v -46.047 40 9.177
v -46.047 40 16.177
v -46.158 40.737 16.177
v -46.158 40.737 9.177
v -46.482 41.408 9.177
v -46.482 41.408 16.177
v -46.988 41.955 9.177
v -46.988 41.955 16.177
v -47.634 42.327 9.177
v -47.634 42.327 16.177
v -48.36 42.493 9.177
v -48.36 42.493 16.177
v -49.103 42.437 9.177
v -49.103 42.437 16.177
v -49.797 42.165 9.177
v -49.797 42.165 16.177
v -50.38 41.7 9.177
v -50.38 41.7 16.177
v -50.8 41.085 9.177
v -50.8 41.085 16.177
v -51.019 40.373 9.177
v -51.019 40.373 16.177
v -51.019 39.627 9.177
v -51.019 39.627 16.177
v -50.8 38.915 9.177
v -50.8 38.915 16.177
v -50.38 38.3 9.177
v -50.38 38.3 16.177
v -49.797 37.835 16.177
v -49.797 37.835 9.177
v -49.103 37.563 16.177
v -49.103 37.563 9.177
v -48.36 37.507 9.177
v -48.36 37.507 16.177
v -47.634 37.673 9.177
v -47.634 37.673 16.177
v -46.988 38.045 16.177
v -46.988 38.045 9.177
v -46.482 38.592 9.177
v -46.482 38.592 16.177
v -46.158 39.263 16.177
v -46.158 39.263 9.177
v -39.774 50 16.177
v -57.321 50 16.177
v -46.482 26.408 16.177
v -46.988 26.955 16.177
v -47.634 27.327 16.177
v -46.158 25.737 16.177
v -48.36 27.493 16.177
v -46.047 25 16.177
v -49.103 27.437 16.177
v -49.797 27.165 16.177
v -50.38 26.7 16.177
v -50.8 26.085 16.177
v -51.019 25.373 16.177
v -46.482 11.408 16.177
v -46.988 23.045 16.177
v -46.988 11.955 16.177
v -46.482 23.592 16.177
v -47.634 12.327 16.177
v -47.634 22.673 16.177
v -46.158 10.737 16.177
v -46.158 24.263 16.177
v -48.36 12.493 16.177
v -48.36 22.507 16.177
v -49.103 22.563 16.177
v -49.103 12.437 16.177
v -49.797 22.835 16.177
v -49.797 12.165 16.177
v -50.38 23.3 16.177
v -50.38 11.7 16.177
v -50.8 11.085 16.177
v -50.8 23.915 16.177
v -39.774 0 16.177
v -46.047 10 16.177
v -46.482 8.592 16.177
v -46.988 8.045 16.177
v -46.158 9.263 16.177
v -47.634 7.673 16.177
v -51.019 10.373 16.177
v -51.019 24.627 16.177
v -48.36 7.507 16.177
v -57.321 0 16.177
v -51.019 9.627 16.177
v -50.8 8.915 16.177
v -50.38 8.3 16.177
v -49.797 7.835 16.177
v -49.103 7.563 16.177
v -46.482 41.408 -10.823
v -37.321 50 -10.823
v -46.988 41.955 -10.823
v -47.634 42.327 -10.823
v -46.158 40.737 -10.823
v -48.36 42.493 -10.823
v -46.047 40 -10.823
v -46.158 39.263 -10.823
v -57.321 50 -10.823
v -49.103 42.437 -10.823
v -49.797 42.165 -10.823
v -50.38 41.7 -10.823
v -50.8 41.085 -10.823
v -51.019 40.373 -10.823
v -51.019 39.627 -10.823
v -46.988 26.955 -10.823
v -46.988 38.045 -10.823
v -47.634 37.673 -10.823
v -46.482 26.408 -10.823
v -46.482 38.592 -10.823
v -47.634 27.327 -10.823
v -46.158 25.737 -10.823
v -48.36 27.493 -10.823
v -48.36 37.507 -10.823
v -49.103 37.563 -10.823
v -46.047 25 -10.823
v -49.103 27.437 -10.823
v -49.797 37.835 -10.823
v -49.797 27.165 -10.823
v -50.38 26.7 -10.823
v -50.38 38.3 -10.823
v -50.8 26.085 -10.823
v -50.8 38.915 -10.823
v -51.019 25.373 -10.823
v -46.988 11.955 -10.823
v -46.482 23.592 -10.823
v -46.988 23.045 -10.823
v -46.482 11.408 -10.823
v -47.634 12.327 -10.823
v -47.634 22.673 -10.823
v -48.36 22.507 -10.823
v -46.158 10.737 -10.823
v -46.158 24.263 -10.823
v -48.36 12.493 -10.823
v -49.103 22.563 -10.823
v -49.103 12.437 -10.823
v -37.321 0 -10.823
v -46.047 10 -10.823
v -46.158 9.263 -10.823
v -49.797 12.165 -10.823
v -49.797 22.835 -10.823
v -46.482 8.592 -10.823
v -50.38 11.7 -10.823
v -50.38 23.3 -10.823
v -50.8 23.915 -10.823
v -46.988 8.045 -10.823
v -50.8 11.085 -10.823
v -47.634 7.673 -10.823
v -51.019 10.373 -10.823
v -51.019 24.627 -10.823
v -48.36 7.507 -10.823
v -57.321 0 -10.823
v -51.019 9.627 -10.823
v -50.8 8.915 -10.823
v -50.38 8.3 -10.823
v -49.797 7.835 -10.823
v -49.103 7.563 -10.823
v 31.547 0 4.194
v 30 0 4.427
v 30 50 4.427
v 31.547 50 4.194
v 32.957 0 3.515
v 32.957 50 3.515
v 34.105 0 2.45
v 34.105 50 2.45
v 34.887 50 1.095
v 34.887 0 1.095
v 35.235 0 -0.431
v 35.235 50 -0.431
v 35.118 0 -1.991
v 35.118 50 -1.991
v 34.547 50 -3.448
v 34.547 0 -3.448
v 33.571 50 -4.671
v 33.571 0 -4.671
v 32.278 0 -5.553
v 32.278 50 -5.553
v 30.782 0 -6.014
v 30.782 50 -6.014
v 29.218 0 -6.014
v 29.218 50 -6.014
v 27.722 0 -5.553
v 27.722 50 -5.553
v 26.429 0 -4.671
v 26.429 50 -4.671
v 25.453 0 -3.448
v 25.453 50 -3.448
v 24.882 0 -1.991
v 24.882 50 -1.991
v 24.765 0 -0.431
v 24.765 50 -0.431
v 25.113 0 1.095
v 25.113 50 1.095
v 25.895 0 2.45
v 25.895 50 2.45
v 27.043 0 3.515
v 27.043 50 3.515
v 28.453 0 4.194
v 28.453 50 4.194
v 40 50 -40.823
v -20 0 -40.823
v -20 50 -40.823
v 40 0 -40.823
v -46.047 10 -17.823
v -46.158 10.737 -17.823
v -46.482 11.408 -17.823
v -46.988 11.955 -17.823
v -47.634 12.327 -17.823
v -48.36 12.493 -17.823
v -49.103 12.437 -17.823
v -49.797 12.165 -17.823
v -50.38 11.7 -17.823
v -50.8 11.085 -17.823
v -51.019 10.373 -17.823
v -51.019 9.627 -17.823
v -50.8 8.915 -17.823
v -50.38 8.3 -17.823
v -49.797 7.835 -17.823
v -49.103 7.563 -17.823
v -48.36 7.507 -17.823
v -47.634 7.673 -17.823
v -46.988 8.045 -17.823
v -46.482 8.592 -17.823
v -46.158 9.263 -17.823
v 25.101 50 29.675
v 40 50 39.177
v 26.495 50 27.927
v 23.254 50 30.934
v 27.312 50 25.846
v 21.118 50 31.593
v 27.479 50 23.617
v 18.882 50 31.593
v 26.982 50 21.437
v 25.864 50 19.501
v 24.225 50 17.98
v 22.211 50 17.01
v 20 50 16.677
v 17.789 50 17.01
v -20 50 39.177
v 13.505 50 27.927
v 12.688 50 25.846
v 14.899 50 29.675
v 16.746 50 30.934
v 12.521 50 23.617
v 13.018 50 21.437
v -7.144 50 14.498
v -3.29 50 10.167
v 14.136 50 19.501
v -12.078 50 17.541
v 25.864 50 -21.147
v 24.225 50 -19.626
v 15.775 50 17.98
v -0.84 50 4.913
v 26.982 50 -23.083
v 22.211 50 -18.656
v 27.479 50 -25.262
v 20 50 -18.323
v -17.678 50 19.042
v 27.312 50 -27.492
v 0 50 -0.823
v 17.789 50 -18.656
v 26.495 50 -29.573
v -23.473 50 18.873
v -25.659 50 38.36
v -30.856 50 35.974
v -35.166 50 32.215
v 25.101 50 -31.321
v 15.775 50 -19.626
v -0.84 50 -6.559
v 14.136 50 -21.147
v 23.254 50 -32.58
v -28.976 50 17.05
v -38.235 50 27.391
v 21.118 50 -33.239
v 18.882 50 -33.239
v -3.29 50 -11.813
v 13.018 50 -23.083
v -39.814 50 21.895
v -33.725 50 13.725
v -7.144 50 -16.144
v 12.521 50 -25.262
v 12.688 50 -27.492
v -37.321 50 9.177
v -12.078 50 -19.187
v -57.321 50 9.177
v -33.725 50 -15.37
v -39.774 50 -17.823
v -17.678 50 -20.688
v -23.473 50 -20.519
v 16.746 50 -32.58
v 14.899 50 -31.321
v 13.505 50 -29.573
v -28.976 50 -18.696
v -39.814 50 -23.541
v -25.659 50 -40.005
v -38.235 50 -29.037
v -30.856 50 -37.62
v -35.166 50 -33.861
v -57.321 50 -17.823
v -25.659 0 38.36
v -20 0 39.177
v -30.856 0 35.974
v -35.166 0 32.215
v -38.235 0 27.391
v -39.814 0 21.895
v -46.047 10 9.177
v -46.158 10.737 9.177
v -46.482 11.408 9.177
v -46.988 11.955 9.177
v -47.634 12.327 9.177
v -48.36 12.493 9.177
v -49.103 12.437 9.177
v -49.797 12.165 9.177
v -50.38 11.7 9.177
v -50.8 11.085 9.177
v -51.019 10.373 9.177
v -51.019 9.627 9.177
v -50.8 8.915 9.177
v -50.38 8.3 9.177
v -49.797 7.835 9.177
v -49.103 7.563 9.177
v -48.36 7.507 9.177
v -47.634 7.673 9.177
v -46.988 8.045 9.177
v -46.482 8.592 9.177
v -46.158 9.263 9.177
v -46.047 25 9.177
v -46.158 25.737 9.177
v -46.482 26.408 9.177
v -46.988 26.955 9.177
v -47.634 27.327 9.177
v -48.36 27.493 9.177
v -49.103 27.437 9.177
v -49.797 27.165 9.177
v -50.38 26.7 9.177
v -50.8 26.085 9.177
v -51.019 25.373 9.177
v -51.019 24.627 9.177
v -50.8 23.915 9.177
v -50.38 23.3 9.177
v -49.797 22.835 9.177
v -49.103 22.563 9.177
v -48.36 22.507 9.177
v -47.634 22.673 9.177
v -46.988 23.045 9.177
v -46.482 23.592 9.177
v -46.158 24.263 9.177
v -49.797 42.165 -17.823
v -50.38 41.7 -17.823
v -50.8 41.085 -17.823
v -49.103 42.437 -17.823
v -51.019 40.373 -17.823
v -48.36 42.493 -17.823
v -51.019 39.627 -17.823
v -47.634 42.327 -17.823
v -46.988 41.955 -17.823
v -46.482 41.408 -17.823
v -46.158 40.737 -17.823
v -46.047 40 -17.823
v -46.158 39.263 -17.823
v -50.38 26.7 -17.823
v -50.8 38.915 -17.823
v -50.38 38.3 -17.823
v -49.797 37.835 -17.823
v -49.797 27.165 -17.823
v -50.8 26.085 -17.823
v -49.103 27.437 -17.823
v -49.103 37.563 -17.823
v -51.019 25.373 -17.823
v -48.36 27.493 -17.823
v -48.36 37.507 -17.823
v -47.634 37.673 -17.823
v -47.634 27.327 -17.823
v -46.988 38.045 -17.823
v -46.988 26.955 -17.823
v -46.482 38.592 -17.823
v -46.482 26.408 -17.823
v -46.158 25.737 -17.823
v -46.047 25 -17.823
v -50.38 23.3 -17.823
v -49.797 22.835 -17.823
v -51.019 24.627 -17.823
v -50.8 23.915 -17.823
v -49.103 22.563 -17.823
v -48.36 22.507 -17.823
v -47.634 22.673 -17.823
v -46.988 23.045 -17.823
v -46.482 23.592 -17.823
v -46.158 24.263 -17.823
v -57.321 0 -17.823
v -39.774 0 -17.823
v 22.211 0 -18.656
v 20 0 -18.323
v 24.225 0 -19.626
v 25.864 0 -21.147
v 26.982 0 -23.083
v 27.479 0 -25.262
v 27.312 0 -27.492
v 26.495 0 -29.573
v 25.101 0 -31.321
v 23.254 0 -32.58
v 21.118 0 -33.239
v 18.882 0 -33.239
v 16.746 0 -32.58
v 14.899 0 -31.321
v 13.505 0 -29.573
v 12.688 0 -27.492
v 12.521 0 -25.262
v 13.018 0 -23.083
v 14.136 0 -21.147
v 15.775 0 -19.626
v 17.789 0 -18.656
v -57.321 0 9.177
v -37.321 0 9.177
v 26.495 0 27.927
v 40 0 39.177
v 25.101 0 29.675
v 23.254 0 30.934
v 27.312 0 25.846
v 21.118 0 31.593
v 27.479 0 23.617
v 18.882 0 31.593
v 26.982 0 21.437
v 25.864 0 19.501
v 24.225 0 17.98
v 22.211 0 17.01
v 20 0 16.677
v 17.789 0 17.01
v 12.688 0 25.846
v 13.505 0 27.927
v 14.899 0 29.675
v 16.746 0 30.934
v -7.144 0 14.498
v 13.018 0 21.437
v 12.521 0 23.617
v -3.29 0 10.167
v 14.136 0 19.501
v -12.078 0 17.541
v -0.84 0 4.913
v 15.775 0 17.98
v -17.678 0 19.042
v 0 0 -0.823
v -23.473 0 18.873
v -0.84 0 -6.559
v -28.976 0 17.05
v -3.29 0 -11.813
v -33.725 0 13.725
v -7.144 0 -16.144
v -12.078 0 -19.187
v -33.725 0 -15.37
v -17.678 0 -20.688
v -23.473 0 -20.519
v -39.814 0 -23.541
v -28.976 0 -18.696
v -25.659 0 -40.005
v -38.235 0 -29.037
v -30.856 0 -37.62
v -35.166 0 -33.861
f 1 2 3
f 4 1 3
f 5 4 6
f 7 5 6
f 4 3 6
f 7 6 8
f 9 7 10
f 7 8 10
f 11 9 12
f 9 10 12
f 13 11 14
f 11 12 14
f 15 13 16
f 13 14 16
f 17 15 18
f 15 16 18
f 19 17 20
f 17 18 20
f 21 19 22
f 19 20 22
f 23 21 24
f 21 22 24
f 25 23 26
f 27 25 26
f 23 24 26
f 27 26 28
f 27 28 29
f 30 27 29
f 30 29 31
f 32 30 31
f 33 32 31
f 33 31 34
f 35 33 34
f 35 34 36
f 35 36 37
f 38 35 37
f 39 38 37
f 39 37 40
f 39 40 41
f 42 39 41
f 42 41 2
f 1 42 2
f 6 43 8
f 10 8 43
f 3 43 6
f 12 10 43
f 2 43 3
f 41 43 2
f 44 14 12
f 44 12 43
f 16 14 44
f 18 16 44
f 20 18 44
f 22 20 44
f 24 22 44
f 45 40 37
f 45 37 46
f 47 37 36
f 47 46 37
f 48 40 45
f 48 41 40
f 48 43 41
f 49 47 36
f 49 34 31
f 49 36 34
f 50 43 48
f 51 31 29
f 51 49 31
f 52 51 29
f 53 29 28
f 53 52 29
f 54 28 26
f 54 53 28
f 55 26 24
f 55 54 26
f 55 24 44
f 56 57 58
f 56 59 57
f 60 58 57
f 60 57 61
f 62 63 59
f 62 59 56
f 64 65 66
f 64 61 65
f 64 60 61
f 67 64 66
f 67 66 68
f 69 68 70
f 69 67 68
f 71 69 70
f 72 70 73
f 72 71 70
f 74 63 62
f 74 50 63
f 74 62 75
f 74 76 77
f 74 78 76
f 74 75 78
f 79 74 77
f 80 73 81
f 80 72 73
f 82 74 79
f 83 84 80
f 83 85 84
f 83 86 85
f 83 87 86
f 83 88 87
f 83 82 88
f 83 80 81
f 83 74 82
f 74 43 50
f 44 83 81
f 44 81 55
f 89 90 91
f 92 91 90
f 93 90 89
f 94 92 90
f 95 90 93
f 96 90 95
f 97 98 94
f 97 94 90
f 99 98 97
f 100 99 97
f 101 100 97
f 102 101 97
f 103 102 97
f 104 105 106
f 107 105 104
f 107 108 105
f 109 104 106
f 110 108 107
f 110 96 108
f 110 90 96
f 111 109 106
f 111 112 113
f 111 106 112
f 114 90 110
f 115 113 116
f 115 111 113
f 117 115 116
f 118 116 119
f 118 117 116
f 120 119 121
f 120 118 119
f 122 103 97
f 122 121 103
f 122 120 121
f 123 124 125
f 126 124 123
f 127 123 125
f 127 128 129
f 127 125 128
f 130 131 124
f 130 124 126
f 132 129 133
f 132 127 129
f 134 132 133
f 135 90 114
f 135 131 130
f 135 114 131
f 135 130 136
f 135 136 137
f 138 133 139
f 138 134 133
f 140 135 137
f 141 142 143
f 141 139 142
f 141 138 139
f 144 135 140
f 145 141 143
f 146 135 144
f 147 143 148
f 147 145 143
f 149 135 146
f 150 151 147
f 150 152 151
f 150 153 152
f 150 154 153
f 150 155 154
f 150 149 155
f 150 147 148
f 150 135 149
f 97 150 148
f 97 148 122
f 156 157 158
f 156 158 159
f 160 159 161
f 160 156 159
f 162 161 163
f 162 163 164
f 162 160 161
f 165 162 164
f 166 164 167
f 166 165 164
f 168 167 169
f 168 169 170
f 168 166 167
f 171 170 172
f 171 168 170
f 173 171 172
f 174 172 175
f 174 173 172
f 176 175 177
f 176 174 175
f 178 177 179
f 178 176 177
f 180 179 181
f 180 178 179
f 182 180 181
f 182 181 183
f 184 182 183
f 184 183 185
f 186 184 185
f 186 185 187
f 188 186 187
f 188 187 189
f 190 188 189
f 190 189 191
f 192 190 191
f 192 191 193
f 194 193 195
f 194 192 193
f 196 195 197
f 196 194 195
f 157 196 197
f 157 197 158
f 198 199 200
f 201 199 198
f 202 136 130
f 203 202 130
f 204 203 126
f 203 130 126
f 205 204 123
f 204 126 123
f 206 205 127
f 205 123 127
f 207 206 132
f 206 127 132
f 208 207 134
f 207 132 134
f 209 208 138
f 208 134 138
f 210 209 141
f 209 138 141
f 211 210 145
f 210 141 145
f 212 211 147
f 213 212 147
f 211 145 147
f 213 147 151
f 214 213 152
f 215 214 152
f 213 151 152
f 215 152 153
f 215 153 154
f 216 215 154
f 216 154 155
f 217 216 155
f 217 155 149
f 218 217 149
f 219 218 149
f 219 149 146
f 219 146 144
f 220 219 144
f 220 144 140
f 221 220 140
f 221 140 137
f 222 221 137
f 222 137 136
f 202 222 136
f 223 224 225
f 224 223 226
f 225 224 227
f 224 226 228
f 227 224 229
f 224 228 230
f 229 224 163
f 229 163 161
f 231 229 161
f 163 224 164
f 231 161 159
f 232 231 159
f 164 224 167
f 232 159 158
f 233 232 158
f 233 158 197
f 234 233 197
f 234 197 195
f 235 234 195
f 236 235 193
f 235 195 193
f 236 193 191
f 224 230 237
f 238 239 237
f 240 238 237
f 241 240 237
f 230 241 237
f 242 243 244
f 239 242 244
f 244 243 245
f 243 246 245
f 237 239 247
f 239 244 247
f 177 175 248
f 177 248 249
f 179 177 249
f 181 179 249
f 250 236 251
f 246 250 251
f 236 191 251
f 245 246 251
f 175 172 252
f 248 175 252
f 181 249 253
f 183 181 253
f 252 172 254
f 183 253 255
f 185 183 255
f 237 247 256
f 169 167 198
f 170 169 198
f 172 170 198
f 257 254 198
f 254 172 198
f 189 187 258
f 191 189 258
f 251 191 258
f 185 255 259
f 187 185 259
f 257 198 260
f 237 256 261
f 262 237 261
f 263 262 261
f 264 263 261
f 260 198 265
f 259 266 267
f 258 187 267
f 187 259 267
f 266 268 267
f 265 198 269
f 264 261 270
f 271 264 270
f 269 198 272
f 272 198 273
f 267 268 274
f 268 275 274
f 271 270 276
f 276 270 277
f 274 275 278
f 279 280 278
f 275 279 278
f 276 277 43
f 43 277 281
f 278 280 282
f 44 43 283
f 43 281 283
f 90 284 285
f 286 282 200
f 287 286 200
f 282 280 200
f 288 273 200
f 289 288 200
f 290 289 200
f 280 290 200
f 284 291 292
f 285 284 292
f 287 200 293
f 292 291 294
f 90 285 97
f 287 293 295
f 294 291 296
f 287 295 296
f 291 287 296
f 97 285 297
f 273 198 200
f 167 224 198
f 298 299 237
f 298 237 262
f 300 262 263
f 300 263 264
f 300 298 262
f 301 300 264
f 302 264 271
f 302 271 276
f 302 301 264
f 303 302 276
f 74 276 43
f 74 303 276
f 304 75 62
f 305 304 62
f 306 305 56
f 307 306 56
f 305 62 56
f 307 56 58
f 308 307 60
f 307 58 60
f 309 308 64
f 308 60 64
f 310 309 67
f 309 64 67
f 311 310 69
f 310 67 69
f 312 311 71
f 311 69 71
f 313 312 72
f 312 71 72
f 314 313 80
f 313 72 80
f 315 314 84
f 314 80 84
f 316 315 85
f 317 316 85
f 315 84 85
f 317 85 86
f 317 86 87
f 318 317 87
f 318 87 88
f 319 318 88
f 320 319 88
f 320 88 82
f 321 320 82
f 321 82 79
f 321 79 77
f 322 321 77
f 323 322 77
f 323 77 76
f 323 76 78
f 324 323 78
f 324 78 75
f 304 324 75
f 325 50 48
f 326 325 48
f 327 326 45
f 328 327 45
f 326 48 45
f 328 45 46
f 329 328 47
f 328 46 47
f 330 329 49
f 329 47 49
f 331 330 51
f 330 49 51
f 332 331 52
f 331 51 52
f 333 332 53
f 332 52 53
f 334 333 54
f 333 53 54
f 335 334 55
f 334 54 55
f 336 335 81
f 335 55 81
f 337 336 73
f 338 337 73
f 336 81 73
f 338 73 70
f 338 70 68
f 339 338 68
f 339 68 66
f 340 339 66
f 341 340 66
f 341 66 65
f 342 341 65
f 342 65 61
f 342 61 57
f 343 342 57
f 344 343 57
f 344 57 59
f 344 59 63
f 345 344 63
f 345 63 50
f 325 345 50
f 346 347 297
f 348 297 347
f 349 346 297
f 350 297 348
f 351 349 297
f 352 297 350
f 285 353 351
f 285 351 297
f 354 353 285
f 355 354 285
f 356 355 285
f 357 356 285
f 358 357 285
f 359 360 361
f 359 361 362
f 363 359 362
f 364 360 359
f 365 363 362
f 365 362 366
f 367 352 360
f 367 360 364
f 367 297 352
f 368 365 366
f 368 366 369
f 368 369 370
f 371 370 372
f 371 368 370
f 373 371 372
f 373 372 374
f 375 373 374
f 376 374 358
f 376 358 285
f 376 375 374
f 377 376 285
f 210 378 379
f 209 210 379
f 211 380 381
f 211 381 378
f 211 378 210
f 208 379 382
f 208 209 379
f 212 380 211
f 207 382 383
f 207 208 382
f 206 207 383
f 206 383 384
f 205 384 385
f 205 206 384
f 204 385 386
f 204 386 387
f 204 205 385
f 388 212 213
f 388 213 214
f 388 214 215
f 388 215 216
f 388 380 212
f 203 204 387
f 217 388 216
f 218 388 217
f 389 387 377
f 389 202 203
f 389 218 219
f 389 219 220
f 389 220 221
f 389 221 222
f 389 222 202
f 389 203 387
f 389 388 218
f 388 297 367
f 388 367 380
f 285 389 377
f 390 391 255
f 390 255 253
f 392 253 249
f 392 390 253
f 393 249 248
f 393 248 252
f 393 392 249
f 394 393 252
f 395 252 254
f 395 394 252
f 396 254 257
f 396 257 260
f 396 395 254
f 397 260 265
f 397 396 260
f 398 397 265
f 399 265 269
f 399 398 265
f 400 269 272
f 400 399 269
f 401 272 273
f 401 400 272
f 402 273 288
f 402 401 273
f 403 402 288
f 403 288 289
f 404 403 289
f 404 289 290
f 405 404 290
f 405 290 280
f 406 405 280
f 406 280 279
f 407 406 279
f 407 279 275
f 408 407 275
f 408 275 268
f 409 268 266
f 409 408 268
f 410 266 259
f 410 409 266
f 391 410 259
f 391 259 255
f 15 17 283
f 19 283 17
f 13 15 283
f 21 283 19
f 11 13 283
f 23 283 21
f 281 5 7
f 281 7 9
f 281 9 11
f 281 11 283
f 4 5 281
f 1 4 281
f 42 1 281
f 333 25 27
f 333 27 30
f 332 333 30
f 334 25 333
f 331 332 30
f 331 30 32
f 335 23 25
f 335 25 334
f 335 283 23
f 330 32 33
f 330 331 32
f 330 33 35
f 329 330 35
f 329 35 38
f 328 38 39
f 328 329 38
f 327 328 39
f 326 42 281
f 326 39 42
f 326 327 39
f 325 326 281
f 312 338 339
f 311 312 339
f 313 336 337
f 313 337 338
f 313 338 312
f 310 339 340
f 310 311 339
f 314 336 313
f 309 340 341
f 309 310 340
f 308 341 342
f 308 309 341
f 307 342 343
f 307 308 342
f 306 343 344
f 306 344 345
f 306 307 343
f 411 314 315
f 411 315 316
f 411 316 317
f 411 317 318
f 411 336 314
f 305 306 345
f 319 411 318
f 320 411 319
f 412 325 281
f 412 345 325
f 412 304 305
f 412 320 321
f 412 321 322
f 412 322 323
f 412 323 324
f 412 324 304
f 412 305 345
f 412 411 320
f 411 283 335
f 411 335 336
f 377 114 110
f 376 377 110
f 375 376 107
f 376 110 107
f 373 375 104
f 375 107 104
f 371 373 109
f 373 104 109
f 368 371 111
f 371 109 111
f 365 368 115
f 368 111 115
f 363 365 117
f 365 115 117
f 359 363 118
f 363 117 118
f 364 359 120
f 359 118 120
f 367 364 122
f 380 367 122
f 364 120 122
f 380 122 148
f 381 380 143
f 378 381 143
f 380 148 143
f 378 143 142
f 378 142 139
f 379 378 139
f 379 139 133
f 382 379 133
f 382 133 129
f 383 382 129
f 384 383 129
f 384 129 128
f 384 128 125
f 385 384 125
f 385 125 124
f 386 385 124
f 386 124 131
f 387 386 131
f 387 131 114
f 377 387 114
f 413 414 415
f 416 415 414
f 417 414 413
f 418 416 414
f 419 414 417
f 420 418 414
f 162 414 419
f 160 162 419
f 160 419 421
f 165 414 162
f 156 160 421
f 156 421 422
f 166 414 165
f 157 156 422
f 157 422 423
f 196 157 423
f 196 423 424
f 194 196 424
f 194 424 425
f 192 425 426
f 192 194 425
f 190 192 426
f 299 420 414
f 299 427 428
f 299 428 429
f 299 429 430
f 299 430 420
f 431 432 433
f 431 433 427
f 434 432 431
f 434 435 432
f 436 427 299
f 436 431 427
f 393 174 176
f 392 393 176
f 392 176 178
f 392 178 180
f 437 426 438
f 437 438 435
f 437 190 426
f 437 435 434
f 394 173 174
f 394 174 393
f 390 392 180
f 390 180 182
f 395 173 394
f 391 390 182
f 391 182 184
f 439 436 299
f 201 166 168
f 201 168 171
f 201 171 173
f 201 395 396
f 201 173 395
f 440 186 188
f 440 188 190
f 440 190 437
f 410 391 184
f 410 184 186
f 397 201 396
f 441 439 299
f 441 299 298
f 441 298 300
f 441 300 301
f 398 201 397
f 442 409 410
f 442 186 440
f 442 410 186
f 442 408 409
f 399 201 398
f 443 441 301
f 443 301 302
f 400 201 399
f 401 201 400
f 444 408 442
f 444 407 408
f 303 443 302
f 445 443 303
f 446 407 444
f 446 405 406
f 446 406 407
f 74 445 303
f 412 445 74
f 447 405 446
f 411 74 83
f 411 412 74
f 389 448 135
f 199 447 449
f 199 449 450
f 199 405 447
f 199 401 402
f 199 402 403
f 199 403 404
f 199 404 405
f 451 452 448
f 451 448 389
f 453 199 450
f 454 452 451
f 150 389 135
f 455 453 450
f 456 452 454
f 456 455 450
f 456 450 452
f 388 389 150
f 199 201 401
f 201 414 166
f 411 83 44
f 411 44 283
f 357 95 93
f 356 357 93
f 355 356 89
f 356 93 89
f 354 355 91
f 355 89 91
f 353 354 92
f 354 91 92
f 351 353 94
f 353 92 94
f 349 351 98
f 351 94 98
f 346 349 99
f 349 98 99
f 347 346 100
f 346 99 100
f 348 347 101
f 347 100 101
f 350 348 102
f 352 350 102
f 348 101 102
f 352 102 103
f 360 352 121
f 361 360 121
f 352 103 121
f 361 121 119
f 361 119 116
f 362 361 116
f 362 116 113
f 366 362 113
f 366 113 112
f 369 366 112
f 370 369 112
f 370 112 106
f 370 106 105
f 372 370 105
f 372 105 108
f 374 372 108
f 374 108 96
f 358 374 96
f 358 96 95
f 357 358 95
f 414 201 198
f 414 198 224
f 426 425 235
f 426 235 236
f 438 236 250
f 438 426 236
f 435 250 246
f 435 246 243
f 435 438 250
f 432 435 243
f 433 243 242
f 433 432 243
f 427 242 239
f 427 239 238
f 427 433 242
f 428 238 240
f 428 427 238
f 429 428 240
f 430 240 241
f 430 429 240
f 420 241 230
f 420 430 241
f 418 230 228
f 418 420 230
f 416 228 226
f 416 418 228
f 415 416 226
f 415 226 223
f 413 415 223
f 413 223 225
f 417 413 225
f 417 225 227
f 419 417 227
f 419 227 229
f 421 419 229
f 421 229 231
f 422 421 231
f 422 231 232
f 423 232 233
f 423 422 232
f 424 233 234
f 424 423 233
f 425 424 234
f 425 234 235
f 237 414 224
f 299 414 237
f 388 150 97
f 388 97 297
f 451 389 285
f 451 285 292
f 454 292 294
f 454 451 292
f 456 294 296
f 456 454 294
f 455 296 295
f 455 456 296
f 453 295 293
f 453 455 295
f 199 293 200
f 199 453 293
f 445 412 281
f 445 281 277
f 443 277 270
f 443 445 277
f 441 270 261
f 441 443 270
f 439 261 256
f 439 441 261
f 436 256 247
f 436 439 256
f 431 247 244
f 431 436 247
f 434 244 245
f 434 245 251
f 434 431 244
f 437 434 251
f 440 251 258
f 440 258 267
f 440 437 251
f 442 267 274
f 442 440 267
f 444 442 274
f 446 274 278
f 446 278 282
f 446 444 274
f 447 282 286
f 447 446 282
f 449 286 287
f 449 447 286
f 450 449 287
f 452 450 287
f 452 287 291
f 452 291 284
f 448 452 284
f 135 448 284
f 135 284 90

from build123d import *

# Parameters (mm, degrees)
SKETCH1_R           = 7.5
SKETCH1_R_2         = 5.25
BOSS_EXTRUDE1_DEPTH = 50
SKETCH2_R           = 2.5
CUT_EXTRUDE1_DEPTH  = 50


with BuildPart() as part:
    # Sketch1 → Boss-Extrude1 (new body)
    with BuildSketch(Plane(origin=(0, 0, 0), x_dir=(1, 0, 0), z_dir=(0, 1, 0))):
        with BuildLine():
            Line((-20, 40.822928267), (40, 40.822928267))
            Line((40, 40.822928267), (40, -39.177071733))
            Line((40, -39.177071733), (-20, -39.177071733))
            ThreePointArc((-20, -39.177071733), (-35.165750888, -32.215476544), (-39.773719933, -16.177071733))
            Line((-39.773719933, -16.177071733), (-57.320508076, -16.177071733))
            Line((-57.320508076, -16.177071733), (-57.320508076, -9.177071733))
            Line((-57.320508076, -9.177071733), (-37.320508076, -9.177071733))
            ThreePointArc((-37.320508076, -9.177071733), (0, 0.822928267), (-37.320508076, 10.822928267))
            Line((-37.320508076, 10.822928267), (-57.320508076, 10.822928267))
            Line((-57.320508076, 10.822928267), (-57.320508076, 17.822928267))
            Line((-57.320508076, 17.822928267), (-39.773719933, 17.822928267))
            ThreePointArc((-39.773719933, 17.822928267), (-35.165750888, 33.861333077), (-20, 40.822928267))
        make_face()
        with Locations(Location((20, 25.822928267, 0), (0, 0, 270))):
            Circle(SKETCH1_R, mode=Mode.SUBTRACT)
        with Locations(Location((20, -24.177071733, 0), (0, 0, 90))):
            Circle(SKETCH1_R, mode=Mode.SUBTRACT)
        with Locations(Location((30, 0.822928267, 0), (0, 0, 270))):
            Circle(SKETCH1_R_2, mode=Mode.SUBTRACT)
    extrude(amount=BOSS_EXTRUDE1_DEPTH)

    # Sketch2 → Cut-Extrude1 (cut)
    with BuildSketch(Plane.XY.offset(16.177071733)):
        with Locations((-48.547114004, 40)):
            Circle(SKETCH2_R)
        with Locations((-48.547114004, 25)):
            Circle(SKETCH2_R)
        with Locations((-48.547114004, 10)):
            Circle(SKETCH2_R)
    extrude(amount=-CUT_EXTRUDE1_DEPTH, mode=Mode.SUBTRACT)


solid = part.part
